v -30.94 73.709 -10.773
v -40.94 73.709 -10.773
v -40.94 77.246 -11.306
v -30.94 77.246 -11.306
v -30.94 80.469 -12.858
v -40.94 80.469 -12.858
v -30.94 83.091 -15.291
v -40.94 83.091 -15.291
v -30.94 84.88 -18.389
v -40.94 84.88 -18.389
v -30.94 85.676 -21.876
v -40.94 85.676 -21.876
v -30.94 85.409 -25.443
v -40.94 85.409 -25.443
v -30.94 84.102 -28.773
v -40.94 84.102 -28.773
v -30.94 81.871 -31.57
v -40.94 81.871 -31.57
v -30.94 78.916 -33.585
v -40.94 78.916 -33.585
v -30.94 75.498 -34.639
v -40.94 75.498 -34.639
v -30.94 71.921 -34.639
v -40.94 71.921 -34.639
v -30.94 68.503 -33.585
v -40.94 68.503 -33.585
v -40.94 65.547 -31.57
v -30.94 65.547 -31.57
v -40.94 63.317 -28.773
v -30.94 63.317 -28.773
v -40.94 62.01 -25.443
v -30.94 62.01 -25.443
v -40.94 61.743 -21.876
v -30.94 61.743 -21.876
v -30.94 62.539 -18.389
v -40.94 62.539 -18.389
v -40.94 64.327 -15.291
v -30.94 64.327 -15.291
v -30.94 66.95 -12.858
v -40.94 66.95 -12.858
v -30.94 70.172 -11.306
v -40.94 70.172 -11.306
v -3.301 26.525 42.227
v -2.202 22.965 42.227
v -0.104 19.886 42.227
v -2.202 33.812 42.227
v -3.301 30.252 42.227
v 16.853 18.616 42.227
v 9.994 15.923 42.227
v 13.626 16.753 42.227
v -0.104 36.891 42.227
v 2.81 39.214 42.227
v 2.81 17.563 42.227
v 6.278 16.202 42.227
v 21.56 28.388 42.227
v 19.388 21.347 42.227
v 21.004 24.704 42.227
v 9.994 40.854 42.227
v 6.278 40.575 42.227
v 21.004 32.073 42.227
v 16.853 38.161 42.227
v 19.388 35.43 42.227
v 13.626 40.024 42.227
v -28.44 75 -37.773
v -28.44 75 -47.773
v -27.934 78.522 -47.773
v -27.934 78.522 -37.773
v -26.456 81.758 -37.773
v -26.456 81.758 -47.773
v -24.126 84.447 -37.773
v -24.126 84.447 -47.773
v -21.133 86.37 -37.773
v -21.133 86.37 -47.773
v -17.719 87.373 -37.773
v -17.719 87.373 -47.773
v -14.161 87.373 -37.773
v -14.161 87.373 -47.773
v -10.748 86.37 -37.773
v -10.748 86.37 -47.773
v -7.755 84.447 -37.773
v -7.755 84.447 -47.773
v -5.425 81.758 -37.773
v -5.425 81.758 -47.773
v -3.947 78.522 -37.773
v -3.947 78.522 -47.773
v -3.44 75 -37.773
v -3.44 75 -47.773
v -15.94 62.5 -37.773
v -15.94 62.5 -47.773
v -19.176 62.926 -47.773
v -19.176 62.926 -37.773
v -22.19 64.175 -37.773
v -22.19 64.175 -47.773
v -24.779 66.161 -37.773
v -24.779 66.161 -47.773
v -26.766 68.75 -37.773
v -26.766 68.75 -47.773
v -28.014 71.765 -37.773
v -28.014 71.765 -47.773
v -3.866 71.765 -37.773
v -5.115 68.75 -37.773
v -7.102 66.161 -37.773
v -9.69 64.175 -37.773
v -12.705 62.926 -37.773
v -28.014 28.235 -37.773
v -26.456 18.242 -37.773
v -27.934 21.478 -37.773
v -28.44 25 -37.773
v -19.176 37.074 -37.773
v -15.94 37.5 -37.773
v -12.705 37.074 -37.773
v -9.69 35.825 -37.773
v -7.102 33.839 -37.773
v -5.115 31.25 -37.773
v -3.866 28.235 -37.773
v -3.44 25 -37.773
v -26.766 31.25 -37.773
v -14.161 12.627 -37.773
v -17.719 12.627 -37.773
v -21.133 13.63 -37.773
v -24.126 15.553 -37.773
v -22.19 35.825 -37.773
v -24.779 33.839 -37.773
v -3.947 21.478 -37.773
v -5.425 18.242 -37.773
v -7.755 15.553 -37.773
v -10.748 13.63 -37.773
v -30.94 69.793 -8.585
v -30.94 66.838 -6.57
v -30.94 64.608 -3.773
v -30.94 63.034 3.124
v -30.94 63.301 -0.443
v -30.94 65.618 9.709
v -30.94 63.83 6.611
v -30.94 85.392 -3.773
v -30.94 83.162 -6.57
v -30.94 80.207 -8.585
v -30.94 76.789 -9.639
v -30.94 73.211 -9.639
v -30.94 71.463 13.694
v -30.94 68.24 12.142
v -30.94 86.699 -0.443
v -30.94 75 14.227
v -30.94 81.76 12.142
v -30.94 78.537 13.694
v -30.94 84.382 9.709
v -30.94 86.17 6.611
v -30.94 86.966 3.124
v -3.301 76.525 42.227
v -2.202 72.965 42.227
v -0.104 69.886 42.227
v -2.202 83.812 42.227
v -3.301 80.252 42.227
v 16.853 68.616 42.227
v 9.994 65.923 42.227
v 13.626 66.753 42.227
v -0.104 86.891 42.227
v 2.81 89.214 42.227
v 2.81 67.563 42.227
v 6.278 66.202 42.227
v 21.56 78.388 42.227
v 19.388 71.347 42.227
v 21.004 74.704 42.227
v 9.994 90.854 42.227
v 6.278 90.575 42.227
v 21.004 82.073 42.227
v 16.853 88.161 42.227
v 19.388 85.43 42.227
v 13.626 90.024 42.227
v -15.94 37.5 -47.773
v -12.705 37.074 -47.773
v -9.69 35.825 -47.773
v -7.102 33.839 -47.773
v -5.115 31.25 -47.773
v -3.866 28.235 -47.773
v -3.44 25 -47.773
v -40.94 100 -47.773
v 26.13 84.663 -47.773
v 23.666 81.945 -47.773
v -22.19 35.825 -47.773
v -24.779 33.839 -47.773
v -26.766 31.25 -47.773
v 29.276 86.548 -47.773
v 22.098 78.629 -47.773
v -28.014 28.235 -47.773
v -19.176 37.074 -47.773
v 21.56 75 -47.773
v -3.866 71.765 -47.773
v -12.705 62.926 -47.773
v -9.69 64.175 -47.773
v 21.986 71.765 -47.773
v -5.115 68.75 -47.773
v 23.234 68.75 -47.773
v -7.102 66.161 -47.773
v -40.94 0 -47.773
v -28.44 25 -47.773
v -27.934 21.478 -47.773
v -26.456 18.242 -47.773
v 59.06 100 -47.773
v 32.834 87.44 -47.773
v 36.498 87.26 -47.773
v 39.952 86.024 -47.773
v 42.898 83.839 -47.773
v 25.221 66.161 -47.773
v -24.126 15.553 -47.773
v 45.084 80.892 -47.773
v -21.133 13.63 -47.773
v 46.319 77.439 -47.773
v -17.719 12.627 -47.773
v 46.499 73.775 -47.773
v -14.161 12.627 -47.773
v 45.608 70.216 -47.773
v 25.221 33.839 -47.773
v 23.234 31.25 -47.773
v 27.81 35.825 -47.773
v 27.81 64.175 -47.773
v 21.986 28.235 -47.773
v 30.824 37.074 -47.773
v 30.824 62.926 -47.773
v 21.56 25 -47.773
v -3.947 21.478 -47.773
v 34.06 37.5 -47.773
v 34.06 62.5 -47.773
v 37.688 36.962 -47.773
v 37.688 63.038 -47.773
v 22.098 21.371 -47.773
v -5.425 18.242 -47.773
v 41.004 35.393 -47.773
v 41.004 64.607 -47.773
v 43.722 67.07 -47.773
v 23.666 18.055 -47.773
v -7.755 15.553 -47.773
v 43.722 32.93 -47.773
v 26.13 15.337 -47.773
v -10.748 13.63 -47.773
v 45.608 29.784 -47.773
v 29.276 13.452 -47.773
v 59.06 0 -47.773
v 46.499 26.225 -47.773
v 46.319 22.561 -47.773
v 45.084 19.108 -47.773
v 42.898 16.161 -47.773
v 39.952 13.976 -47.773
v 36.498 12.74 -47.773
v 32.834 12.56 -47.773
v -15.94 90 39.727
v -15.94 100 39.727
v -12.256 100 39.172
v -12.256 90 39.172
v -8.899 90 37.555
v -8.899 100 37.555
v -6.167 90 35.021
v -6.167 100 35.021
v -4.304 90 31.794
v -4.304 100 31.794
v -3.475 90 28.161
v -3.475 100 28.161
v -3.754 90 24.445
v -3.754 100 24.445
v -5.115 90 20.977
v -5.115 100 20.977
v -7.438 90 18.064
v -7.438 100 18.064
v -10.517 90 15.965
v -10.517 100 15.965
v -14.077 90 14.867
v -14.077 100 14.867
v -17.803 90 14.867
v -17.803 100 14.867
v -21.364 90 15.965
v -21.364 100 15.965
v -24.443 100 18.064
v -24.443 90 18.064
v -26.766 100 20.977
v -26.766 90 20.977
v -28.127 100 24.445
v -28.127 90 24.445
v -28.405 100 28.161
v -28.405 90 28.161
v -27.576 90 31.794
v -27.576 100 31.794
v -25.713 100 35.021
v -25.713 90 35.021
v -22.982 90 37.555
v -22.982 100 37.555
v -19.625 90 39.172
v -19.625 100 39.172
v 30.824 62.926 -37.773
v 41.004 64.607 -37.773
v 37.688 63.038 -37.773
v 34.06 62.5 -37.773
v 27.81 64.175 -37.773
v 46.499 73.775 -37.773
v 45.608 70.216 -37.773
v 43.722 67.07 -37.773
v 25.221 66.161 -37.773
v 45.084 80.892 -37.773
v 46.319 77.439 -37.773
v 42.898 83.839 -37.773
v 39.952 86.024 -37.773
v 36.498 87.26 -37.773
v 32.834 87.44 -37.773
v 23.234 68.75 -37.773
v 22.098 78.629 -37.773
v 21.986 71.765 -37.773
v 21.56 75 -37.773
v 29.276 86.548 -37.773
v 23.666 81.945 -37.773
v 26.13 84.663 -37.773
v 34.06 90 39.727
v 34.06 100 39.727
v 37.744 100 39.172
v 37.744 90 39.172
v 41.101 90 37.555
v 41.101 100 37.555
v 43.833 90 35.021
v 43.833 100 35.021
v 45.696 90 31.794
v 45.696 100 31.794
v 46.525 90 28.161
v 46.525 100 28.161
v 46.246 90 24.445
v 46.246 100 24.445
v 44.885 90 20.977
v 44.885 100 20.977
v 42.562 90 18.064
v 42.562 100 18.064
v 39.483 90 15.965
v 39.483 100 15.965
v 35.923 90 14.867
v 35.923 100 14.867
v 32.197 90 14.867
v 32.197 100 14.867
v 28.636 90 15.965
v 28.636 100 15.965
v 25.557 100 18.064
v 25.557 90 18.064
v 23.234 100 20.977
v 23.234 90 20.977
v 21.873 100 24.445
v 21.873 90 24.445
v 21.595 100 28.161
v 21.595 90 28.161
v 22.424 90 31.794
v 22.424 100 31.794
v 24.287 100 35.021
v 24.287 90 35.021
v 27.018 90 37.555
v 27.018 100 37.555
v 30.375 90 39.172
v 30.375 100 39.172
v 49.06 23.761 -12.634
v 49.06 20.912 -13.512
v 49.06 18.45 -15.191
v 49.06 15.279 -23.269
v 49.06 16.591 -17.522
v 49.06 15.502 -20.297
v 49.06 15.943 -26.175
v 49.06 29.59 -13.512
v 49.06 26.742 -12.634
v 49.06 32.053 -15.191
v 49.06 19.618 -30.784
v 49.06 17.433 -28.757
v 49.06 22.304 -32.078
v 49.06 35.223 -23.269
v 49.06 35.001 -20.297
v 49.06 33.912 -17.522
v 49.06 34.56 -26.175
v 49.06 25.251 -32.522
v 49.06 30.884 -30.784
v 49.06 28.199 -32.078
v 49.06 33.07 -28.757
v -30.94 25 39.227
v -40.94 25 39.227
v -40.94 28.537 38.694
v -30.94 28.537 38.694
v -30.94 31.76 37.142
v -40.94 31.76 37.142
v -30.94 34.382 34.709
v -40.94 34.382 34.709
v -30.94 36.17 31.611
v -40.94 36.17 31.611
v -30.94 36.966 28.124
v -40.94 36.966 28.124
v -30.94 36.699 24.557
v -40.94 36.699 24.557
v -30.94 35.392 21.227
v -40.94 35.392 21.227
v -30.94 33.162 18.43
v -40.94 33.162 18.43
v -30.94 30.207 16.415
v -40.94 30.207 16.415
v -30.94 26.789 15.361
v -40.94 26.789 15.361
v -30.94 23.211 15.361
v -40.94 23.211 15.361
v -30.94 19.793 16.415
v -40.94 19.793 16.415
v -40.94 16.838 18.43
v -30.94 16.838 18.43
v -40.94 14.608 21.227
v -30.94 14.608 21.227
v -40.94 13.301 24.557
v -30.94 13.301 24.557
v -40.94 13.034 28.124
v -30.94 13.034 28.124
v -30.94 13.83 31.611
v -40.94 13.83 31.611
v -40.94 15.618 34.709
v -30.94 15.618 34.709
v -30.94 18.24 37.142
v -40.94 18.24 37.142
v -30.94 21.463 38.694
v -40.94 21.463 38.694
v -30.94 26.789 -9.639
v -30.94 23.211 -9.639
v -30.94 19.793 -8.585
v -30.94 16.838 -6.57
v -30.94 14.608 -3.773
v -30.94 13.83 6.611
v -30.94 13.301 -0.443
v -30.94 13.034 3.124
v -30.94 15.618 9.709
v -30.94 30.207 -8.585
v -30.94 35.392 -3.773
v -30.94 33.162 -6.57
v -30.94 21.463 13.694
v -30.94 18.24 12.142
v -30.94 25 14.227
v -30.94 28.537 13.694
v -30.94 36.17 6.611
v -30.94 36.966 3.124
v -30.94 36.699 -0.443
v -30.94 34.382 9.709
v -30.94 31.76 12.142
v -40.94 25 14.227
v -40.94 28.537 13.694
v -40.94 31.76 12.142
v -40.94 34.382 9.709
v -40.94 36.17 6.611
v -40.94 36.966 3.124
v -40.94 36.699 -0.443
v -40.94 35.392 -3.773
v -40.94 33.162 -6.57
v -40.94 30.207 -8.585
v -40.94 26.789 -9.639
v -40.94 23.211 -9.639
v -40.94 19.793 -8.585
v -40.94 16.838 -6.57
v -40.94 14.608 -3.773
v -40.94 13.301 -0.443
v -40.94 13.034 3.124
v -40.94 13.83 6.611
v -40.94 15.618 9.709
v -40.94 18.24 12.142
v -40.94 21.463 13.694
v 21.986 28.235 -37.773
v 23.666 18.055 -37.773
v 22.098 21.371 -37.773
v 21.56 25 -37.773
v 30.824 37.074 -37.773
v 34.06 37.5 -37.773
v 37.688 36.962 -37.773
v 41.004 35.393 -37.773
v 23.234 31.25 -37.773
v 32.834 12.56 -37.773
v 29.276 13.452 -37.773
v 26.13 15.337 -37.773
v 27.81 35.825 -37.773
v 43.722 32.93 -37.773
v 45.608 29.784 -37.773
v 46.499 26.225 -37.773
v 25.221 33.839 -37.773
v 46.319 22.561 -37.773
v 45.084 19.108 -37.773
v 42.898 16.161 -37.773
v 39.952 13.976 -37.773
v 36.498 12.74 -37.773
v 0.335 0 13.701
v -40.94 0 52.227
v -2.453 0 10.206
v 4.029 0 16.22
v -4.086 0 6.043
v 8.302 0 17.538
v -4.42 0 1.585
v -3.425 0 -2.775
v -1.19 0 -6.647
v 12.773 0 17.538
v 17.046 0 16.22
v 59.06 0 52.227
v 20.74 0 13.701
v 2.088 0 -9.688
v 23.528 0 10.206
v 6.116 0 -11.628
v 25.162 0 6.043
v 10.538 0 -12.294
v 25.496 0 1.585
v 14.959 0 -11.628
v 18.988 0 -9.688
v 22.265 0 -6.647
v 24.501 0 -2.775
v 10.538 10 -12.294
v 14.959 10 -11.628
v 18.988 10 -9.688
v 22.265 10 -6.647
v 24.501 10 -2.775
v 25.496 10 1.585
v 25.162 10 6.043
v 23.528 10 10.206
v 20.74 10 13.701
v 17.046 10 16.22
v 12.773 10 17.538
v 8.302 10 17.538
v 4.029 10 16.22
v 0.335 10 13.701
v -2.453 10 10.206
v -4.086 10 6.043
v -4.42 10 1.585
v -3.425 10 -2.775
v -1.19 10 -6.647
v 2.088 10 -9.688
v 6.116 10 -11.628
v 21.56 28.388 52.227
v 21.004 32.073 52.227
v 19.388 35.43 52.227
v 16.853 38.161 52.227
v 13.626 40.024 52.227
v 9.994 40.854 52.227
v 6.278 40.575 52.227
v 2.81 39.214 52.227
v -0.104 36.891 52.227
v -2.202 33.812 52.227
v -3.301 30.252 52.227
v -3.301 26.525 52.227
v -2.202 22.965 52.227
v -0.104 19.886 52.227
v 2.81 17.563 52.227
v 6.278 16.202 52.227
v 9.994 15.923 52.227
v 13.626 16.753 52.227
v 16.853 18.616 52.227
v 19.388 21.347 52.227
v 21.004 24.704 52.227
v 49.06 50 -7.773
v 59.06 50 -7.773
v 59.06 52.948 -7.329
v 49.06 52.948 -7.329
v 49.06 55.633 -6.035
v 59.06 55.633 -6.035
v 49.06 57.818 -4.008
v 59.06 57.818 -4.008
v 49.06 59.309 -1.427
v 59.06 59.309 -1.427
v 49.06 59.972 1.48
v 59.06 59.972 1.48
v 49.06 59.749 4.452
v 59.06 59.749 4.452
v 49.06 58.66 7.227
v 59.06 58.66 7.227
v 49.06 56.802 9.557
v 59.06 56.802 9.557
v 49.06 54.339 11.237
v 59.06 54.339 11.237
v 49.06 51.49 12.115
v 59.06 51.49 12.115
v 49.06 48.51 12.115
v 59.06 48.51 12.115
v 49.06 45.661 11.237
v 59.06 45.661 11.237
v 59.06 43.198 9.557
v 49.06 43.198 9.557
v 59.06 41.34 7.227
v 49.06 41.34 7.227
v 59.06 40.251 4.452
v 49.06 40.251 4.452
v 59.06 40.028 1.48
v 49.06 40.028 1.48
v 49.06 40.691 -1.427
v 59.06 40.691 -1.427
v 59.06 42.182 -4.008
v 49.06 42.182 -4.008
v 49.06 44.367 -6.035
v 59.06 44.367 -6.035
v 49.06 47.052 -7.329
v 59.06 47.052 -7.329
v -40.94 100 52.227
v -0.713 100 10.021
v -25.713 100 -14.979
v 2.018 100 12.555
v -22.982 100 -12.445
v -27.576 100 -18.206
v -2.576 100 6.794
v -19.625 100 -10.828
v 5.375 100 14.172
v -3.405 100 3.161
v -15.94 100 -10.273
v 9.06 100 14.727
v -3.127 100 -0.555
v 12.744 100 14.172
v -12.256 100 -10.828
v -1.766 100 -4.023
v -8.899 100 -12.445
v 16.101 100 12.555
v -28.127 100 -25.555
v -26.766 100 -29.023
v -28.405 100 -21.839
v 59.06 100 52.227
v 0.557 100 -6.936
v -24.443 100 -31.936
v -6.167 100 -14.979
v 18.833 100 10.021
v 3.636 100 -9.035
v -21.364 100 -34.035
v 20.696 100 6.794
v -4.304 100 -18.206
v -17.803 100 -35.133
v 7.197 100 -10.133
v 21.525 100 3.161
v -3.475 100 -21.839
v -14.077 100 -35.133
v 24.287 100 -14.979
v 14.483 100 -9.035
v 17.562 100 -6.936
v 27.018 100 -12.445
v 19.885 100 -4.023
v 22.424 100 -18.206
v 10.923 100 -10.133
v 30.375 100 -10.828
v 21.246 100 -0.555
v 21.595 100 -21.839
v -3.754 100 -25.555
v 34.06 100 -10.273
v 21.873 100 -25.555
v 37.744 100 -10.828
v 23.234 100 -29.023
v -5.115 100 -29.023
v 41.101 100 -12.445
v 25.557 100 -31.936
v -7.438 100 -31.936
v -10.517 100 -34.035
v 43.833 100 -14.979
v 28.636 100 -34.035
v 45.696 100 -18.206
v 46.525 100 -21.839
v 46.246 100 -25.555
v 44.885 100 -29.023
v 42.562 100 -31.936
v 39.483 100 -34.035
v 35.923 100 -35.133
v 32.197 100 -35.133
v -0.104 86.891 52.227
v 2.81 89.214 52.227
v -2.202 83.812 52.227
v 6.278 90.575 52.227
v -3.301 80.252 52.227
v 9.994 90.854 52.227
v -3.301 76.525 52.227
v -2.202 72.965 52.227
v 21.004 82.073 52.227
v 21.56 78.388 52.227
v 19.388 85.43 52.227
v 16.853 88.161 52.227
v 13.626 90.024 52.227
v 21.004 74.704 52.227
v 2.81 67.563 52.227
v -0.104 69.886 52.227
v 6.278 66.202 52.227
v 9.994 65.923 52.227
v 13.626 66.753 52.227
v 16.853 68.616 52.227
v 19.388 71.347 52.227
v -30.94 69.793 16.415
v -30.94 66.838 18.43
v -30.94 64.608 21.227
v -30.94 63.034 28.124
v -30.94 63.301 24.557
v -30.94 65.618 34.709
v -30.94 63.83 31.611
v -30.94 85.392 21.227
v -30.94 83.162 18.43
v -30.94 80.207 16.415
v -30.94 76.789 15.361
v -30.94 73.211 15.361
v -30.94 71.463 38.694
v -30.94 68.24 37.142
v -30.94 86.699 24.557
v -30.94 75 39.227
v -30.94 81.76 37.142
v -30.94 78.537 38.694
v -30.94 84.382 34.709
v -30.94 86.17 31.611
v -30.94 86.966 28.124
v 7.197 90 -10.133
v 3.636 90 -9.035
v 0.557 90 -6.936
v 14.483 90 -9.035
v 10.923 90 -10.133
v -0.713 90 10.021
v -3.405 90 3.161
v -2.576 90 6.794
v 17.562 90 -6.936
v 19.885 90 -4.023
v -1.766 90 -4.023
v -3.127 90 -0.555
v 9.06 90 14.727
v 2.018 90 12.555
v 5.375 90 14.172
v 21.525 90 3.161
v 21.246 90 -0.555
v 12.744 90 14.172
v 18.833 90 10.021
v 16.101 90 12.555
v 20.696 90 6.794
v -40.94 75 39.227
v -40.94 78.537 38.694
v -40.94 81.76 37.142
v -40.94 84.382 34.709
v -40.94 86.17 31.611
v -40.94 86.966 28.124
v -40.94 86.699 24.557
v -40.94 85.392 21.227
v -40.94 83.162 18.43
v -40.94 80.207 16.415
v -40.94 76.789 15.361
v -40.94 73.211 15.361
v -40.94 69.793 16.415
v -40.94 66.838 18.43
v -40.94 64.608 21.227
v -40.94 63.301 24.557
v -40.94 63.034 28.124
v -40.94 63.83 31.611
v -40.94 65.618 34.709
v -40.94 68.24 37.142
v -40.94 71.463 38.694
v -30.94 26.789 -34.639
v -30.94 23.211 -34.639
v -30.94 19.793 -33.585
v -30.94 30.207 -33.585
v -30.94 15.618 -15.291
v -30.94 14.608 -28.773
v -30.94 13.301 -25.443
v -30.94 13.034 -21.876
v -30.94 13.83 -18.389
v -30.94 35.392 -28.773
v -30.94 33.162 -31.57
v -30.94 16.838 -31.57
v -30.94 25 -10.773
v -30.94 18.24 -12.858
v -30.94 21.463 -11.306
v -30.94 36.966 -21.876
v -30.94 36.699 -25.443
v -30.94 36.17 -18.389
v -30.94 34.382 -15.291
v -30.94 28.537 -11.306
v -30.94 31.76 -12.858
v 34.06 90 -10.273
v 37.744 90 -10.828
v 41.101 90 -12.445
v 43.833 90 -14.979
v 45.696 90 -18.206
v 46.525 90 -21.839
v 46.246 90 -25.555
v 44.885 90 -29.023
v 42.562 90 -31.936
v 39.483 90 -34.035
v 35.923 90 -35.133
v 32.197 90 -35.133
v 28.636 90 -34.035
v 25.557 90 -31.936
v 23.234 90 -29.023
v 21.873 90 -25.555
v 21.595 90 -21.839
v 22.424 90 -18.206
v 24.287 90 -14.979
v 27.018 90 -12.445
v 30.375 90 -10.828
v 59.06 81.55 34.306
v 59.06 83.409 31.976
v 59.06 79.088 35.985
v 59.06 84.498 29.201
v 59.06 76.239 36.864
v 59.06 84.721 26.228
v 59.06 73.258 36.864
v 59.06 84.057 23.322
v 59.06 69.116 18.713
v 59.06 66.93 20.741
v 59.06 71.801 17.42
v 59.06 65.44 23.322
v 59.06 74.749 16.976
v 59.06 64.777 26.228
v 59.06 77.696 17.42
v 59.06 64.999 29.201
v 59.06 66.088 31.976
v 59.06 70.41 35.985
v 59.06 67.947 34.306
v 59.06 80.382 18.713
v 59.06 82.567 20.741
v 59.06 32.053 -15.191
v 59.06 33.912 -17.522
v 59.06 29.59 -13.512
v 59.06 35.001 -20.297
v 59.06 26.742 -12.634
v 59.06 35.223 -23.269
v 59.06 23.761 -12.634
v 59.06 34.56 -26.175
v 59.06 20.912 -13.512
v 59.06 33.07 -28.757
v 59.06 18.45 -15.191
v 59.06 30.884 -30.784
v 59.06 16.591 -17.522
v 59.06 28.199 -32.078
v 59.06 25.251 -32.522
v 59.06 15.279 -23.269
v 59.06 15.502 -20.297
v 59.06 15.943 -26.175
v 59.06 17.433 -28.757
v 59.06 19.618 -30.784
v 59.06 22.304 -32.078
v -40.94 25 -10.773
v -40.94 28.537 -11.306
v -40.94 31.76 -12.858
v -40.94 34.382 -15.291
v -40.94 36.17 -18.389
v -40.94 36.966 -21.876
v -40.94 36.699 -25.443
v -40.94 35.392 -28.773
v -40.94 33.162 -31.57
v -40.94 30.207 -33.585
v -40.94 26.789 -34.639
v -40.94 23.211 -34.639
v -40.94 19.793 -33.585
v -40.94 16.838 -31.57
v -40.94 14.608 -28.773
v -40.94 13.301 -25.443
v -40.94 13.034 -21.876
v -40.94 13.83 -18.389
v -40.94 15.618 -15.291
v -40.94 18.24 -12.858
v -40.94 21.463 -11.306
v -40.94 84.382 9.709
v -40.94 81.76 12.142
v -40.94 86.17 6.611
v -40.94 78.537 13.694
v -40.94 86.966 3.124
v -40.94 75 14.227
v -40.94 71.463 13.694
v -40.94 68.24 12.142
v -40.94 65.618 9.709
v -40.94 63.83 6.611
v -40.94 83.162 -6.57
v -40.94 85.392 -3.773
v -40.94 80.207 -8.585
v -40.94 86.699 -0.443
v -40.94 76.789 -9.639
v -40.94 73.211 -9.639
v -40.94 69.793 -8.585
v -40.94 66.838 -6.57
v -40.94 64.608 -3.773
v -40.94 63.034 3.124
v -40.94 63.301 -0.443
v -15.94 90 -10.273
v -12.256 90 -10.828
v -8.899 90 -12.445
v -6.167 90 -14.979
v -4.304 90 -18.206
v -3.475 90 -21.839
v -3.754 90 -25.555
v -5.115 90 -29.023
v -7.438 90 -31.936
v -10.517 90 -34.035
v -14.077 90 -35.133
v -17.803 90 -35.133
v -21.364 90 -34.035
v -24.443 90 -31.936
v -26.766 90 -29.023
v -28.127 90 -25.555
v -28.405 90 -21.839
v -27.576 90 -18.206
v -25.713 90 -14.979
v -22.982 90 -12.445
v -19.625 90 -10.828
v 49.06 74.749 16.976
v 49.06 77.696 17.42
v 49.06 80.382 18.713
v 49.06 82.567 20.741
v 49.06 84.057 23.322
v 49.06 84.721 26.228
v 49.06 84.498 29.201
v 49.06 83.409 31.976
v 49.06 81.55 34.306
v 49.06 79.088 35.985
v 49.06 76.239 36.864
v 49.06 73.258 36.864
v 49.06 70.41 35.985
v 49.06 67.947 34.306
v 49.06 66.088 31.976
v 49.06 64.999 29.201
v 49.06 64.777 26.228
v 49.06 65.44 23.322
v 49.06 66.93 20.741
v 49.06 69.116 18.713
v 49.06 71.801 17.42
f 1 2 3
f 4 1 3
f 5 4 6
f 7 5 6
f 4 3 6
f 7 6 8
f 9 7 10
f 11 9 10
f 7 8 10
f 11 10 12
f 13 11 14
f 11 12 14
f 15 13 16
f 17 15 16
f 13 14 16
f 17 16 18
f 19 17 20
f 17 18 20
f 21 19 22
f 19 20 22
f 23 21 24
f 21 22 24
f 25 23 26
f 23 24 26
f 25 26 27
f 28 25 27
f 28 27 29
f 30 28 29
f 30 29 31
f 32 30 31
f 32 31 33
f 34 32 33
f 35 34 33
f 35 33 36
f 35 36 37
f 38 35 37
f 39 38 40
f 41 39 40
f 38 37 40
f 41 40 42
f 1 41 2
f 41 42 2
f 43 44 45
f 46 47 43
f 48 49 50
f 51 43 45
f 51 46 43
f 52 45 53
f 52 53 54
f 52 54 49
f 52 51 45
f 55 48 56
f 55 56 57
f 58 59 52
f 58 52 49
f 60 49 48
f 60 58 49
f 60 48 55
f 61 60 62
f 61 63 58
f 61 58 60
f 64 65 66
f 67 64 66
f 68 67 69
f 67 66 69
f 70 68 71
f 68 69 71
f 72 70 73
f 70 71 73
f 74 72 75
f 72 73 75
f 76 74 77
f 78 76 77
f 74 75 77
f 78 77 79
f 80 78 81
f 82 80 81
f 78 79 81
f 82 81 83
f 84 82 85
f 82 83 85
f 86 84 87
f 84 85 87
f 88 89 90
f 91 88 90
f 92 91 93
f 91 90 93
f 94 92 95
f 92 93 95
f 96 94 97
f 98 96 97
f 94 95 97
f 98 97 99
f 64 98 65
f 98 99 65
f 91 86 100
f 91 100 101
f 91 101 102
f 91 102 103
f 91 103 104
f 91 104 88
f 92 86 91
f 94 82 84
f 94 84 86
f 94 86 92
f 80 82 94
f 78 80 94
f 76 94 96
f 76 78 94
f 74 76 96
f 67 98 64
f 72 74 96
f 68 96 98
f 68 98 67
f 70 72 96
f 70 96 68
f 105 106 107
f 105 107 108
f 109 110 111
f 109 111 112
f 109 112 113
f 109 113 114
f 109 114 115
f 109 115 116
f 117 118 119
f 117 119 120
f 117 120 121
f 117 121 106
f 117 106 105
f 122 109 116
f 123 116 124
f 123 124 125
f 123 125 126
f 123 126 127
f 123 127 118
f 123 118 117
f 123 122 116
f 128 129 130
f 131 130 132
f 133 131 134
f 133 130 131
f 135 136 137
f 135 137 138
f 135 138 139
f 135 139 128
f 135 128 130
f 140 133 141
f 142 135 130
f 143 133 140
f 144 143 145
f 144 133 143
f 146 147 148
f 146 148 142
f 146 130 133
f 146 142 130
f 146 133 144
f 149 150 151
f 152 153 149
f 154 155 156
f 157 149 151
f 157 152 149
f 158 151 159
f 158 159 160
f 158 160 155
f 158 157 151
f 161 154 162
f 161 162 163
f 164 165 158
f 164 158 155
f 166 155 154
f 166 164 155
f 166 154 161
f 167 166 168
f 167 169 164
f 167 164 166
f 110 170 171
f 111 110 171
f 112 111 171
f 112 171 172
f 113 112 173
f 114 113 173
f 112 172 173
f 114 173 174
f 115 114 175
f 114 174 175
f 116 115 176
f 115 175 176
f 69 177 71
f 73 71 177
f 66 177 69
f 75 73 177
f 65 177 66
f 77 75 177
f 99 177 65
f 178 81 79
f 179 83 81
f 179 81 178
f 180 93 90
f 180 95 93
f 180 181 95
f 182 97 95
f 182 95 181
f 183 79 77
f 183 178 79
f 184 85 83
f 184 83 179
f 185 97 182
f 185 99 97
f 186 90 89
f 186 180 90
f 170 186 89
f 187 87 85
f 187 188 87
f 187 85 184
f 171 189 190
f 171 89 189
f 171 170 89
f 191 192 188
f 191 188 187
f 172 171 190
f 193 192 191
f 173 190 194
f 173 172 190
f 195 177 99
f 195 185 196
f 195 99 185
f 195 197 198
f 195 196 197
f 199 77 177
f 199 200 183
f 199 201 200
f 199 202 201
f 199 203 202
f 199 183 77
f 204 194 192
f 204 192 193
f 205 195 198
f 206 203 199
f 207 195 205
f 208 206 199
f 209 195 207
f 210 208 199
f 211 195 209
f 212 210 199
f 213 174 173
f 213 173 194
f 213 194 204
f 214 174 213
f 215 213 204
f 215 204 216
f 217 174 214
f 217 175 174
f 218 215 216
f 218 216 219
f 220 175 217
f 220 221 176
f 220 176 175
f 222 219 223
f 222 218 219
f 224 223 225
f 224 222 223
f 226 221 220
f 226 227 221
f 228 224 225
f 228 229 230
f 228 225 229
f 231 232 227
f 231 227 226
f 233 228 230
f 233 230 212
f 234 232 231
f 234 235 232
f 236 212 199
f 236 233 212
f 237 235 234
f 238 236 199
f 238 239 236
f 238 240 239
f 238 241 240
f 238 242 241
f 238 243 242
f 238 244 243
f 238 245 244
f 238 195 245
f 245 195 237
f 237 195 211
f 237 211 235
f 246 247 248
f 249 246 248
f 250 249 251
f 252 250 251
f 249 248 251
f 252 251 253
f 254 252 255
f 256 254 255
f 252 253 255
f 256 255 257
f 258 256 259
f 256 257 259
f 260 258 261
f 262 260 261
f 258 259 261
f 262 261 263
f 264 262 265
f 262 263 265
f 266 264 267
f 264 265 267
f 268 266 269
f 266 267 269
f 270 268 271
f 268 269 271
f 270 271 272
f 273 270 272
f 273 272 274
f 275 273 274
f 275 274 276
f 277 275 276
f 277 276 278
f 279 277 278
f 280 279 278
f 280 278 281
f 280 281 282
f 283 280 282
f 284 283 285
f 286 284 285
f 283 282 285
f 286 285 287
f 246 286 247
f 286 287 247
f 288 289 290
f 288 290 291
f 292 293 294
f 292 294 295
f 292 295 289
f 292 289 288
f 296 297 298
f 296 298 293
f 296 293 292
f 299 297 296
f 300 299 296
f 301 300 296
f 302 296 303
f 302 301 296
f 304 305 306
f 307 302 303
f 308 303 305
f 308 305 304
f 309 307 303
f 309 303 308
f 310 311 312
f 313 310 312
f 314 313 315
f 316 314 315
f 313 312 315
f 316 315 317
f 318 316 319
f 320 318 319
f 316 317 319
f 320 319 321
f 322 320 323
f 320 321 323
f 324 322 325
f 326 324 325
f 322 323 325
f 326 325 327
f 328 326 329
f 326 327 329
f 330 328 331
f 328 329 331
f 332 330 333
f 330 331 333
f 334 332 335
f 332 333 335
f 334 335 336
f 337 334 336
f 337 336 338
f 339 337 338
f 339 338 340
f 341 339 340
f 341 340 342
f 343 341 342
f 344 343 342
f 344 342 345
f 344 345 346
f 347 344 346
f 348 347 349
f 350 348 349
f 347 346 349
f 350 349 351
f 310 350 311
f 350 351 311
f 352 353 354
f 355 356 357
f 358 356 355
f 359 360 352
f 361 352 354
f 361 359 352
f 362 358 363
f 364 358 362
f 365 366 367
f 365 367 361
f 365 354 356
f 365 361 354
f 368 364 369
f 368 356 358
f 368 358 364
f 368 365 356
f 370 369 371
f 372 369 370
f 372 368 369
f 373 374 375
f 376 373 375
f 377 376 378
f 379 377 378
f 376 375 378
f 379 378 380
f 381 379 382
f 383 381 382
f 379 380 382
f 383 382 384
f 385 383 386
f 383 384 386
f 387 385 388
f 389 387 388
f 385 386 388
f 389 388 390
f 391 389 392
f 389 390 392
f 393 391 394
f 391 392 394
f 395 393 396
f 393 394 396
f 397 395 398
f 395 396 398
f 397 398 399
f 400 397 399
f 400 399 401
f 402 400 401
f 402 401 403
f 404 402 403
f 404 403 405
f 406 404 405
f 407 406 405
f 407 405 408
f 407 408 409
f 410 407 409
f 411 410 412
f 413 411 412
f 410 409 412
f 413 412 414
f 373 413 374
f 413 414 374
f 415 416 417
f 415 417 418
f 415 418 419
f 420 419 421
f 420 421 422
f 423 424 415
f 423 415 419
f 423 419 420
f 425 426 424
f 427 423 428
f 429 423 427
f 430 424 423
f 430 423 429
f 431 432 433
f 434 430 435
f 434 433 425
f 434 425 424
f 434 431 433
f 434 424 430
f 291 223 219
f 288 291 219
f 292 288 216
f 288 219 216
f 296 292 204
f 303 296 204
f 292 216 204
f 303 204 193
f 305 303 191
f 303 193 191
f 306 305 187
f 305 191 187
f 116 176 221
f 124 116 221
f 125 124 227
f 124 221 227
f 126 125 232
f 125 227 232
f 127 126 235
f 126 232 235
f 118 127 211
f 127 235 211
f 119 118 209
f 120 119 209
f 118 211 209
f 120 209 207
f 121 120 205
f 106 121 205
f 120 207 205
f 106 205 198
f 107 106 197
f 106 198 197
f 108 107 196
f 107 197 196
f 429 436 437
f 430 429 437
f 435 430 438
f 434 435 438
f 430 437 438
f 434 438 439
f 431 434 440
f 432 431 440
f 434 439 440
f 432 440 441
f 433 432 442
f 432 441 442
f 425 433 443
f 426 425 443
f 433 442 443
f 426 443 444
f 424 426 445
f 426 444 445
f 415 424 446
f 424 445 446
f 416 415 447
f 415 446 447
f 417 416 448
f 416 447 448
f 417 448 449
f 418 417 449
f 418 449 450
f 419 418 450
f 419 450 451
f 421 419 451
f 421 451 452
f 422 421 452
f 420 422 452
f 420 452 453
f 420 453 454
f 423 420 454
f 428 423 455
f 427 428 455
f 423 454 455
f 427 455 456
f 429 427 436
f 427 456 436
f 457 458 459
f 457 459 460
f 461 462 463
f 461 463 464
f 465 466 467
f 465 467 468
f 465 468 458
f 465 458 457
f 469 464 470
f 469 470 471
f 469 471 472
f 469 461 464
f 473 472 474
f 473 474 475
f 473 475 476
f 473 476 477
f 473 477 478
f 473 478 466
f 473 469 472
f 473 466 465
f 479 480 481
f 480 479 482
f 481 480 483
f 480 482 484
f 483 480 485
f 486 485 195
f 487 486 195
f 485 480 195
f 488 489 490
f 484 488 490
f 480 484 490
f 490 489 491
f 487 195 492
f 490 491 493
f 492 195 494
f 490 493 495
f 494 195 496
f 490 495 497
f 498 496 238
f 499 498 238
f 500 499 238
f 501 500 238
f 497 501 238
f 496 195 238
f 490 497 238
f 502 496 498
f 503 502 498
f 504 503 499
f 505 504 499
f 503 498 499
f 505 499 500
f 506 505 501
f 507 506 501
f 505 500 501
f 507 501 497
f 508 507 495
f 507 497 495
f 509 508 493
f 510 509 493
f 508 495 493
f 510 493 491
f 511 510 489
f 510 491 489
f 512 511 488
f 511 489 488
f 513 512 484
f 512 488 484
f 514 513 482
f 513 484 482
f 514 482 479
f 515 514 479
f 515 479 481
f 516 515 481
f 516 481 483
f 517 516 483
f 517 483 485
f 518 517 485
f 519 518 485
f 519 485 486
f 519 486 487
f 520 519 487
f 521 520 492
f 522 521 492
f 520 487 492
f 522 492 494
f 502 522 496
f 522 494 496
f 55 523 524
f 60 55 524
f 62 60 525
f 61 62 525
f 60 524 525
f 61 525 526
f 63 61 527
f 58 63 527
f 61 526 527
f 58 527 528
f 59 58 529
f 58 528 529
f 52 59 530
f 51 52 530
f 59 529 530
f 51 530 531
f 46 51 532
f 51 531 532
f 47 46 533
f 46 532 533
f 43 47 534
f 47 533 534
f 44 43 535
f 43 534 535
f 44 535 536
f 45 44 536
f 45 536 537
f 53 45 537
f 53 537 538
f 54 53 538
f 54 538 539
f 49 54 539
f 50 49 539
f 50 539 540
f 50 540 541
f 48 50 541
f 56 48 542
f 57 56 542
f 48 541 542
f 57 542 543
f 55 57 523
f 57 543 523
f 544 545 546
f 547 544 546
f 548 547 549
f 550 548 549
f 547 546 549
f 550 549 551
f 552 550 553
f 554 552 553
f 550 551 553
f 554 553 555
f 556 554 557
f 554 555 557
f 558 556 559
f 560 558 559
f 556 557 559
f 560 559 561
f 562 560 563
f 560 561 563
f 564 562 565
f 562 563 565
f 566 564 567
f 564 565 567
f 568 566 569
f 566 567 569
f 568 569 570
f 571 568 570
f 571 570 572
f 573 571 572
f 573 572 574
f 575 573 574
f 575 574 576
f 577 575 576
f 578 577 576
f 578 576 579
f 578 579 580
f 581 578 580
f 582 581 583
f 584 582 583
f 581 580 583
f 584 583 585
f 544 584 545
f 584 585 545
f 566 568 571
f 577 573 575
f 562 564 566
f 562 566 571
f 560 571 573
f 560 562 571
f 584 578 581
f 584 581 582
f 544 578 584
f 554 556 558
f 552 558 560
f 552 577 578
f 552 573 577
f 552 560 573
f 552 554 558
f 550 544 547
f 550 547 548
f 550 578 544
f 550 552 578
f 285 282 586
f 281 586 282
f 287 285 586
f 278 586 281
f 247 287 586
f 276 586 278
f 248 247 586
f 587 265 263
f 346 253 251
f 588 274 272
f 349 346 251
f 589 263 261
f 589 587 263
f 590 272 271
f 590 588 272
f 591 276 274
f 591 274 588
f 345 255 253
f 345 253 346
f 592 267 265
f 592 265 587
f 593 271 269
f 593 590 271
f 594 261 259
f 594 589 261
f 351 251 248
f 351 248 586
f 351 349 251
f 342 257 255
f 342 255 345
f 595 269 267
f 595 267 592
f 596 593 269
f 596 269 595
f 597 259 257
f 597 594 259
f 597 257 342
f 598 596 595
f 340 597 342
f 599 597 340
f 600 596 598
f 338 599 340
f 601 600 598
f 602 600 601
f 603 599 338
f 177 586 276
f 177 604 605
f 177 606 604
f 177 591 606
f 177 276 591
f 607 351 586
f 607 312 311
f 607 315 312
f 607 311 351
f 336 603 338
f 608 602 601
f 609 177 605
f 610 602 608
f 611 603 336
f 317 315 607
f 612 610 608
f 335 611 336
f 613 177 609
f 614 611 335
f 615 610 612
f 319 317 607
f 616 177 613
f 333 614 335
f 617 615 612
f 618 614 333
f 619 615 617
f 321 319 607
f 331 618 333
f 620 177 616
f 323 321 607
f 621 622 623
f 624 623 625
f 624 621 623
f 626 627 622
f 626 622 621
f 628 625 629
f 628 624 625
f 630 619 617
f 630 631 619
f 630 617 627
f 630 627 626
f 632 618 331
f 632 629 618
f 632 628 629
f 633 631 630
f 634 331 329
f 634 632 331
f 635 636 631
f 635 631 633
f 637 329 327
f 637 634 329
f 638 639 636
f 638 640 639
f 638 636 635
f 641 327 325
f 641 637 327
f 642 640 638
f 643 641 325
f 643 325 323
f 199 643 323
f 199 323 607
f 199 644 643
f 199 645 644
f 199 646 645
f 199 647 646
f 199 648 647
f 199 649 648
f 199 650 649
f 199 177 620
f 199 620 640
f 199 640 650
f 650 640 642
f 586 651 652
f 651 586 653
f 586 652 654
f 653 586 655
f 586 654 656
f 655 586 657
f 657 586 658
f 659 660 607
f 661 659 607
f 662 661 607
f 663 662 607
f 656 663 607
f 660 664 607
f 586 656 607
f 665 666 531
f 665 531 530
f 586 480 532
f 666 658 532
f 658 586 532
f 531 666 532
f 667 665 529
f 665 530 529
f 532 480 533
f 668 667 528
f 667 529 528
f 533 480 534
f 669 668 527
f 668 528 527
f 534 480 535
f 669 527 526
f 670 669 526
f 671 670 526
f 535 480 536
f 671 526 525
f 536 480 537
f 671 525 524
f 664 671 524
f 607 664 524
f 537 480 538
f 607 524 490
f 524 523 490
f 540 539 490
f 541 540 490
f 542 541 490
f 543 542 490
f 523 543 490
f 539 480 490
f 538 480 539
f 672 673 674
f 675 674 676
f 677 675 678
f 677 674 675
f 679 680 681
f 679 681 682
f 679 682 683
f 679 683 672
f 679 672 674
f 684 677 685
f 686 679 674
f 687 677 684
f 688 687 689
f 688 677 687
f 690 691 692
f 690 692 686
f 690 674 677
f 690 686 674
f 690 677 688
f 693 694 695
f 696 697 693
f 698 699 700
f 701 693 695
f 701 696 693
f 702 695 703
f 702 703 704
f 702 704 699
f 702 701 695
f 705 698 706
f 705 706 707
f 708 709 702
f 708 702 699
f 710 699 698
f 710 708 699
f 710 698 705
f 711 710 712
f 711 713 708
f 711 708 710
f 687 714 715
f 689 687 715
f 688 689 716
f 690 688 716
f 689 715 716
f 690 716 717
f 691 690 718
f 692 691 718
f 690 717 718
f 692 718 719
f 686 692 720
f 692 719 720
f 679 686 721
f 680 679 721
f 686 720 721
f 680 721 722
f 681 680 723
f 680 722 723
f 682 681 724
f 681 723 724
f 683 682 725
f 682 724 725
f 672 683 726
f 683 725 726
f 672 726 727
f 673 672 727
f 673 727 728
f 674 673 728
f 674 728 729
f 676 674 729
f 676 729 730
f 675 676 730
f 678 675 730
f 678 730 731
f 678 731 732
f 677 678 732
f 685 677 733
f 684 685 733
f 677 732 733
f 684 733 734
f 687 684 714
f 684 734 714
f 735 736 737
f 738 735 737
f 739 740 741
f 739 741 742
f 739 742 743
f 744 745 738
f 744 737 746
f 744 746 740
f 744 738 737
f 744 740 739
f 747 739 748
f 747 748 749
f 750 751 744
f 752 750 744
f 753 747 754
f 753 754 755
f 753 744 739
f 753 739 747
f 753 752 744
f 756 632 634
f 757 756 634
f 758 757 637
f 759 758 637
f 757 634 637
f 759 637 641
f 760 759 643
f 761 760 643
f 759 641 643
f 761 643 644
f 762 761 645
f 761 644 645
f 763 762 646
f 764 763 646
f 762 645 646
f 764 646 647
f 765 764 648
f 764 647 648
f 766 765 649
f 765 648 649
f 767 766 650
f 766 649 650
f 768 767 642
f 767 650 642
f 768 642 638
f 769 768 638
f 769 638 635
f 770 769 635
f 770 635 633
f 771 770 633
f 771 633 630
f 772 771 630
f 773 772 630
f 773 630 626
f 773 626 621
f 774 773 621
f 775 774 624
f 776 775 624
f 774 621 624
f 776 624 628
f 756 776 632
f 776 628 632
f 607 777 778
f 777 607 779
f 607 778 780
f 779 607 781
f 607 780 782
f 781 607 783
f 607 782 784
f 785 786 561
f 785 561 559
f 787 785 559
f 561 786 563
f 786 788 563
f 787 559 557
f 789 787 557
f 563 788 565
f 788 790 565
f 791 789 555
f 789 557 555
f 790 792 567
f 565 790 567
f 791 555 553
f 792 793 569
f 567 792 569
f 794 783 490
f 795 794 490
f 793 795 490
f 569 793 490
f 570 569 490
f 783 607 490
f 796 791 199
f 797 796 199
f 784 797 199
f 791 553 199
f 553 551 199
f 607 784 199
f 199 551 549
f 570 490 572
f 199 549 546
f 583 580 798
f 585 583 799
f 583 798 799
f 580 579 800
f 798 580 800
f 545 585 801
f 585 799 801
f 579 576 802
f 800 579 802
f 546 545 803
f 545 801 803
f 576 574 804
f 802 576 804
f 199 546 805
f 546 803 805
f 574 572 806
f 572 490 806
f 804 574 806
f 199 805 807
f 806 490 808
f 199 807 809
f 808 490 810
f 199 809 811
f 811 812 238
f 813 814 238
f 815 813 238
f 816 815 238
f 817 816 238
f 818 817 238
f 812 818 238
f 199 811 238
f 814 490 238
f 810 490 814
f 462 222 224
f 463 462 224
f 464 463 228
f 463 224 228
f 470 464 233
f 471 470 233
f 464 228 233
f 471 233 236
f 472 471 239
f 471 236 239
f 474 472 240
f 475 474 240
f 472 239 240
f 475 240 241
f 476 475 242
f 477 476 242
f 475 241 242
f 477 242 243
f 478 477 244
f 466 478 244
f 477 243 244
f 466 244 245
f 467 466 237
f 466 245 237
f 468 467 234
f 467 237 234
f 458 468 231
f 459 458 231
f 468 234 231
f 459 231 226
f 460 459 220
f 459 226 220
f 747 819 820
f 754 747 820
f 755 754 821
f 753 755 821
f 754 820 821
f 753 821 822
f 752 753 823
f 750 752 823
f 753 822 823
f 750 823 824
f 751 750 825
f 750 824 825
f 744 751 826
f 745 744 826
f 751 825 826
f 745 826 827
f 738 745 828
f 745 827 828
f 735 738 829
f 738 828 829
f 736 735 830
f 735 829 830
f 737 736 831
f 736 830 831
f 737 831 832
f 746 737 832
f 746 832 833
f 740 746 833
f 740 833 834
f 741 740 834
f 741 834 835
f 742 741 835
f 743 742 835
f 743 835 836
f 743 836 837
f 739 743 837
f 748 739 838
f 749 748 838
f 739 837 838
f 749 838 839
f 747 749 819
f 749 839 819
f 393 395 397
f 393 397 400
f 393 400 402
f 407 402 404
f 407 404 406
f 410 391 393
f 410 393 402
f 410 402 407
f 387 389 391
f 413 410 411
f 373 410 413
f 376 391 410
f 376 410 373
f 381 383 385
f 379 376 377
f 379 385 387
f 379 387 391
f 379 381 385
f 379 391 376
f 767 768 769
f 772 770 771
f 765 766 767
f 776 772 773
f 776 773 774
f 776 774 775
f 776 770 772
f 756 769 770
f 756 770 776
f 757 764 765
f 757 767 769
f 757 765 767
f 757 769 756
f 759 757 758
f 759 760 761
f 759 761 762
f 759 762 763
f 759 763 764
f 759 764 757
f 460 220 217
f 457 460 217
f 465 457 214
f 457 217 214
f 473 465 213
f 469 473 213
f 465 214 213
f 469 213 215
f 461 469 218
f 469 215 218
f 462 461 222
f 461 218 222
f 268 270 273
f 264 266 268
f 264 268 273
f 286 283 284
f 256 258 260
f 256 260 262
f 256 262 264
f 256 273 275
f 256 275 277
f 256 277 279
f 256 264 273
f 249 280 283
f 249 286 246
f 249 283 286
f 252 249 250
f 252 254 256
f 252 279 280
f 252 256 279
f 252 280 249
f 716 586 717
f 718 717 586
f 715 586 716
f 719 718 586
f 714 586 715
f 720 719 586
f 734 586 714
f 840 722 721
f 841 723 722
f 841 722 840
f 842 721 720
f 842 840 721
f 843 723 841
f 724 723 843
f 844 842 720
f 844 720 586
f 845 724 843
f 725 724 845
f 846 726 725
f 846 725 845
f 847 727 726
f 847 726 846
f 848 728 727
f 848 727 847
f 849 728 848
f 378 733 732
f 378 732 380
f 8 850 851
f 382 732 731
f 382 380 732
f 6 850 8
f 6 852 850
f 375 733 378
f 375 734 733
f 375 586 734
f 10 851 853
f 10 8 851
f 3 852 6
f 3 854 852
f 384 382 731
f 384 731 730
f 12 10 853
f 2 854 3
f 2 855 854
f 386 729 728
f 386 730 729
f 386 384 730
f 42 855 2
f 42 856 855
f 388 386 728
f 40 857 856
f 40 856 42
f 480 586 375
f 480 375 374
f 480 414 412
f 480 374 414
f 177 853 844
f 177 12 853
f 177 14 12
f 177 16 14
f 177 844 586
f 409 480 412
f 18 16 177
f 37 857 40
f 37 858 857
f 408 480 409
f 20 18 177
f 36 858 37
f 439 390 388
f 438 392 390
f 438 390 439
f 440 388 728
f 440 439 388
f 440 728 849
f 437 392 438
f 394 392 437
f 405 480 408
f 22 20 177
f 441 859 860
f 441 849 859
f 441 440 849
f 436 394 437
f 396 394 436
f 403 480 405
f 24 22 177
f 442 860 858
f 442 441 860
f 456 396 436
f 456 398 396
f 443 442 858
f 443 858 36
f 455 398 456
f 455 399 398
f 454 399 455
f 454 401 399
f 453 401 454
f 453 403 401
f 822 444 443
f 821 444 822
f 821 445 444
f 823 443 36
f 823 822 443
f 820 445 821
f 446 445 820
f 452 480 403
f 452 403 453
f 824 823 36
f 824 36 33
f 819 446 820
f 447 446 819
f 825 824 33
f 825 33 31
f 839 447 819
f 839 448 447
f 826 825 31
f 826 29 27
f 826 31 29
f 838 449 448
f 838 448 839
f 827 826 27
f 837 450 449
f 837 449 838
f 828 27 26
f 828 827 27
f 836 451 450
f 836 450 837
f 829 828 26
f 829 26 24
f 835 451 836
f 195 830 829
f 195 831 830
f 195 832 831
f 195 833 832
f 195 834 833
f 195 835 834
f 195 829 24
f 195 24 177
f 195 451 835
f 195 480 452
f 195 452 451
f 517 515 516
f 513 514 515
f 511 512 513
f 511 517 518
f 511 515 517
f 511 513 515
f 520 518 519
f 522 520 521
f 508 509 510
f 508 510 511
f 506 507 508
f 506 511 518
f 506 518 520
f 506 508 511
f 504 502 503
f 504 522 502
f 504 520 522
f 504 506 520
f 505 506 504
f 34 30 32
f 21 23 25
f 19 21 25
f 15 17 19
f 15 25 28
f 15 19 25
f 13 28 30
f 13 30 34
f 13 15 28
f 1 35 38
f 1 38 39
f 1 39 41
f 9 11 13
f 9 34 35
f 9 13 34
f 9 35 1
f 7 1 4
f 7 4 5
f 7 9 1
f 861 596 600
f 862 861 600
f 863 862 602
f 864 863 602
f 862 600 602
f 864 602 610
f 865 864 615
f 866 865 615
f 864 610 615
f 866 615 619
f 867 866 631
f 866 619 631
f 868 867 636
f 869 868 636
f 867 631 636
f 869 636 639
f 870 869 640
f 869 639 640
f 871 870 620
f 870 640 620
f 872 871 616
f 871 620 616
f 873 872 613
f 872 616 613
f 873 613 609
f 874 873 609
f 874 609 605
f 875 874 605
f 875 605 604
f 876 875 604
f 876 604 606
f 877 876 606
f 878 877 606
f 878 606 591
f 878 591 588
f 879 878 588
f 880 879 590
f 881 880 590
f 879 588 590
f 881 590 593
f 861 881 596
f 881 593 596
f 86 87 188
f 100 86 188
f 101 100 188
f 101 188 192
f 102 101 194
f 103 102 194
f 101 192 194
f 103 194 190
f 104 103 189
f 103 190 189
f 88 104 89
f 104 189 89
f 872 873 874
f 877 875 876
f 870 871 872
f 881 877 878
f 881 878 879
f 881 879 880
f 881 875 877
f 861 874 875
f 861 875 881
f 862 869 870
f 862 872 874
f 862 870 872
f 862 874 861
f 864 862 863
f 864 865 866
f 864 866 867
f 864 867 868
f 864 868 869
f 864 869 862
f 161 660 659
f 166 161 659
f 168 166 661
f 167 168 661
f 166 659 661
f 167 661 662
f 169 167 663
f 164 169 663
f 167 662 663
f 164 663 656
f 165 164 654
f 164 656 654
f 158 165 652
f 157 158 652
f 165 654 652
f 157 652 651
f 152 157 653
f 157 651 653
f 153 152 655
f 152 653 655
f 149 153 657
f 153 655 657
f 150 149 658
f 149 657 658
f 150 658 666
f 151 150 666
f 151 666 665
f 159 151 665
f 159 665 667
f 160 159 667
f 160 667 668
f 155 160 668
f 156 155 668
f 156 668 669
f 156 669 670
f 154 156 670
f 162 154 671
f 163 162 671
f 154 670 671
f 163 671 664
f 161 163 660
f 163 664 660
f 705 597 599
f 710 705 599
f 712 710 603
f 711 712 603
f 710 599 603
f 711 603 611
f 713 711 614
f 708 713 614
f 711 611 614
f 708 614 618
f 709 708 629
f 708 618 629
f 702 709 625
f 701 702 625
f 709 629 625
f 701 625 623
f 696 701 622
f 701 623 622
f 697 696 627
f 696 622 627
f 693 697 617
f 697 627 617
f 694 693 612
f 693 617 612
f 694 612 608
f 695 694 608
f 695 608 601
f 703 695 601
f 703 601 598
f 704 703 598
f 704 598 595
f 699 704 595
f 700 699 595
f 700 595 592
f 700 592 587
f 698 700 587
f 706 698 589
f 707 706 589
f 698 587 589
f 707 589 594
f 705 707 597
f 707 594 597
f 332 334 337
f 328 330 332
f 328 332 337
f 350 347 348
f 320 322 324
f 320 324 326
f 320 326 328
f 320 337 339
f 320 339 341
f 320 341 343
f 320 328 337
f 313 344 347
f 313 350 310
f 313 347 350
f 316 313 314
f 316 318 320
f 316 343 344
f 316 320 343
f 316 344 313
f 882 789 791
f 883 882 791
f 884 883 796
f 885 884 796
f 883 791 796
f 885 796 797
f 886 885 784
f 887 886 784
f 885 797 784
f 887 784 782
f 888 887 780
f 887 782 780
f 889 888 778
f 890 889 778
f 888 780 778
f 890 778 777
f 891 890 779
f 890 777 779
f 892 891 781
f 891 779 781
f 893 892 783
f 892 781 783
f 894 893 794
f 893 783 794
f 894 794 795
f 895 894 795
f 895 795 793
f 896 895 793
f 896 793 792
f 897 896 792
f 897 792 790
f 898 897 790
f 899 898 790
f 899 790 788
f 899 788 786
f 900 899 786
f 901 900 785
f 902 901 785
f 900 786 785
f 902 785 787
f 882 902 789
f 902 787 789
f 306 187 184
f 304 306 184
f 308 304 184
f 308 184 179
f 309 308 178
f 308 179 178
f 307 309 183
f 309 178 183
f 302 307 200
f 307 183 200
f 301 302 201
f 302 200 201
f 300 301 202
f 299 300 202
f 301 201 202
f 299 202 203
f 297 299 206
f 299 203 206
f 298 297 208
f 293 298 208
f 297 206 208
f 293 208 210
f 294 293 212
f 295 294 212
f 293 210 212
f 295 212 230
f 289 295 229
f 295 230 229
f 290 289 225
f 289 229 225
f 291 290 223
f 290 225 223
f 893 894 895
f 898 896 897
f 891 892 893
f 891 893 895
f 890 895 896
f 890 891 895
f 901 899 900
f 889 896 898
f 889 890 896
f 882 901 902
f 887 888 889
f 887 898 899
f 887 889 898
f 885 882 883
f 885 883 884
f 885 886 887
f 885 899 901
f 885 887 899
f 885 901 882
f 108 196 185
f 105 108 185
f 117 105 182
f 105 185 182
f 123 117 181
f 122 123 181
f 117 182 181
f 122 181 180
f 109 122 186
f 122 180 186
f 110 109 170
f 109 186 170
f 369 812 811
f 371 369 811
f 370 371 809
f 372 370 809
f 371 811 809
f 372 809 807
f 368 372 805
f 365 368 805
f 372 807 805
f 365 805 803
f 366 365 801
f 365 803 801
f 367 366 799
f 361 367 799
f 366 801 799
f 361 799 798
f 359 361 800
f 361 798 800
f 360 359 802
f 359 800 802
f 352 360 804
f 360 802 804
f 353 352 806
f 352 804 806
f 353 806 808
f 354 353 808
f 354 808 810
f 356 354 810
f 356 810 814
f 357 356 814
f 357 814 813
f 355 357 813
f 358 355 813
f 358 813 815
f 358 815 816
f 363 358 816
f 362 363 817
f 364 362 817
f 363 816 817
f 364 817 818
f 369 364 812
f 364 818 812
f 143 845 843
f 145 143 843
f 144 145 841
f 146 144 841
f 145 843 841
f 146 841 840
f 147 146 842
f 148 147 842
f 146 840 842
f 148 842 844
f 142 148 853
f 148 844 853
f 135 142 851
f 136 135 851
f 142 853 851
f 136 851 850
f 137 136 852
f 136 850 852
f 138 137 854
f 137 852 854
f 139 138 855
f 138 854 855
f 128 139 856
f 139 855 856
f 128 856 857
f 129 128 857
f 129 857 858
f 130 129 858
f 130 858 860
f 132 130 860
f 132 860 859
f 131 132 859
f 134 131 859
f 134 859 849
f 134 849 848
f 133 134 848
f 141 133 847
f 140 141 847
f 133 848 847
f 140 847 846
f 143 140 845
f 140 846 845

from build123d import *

# Parameters (mm, degrees)
SKETCH1_W           = 100
SKETCH1_H           = 100
BOSS_EXTRUDE1_DEPTH = 100
SKETCH2_R           = 15
CUT_EXTRUDE2_DEPTH  = 10
SKETCH3_R           = 10
CUT_EXTRUDE3_DEPTH  = 10
CUT_EXTRUDE5_DEPTH  = 10
SKETCH11_R          = 12.5
CUT_EXTRUDE6_DEPTH  = 10
SKETCH12_R          = 12.5
CUT_EXTRUDE7_DEPTH  = 10
SKETCH13_R          = 12
CUT_EXTRUDE12_DEPTH = 10


with BuildPart() as part:
    # Sketch1 → Boss-Extrude1 (new body)
    with BuildSketch(Plane(origin=(0, 0, 0), x_dir=(1, 0, 0), z_dir=(0, 1, 0))):
        with Locations((9.059630809, -2.226900841)):
            Rectangle(SKETCH1_W, SKETCH1_H)
    extrude(amount=BOSS_EXTRUDE1_DEPTH)

    # Sketch2 → Cut-Extrude2 (cut)
    with BuildSketch(Plane.XZ):
        with Locations(Location((10.537704993, 2.705564775, 0), (0, 0, 270))):
            Circle(SKETCH2_R)
    extrude(amount=-CUT_EXTRUDE2_DEPTH, mode=Mode.SUBTRACT)

    # Sketch3 → Cut-Extrude3 (cut)
    with BuildSketch(Plane(origin=(59.059630809, 0, 0), x_dir=(0, 0, -1), z_dir=(1, 0, 0))):
        with Locations((-2.226900841, 50)):
            Circle(SKETCH3_R)
        with Locations((22.5218365, 25.251262658)):
            Circle(SKETCH3_R)
        with Locations((-26.975638183, 74.748737342)):
            Circle(SKETCH3_R)
    extrude(amount=-CUT_EXTRUDE3_DEPTH, mode=Mode.SUBTRACT)

    # Sketch5 → Cut-Extrude5 (cut)
    with BuildSketch(Plane(origin=(0, 0, -47.773099159), x_dir=(-1, 0, 0), z_dir=(0, 0, -1))):
        with BuildLine():
            ThreePointArc((-34.059630809, 62.5), (-25.220796045, 66.161165235), (-21.559630809, 75))
            Line((-21.559630809, 75), (-34.059630809, 75))
            Line((-34.059630809, 75), (-34.059630809, 62.5))
        make_face()
        with BuildLine():
            Line((-34.059630809, 75), (-21.559630809, 75))
            ThreePointArc((-21.559630809, 75), (-42.898465574, 83.838834765), (-34.059630809, 62.5))
            Line((-34.059630809, 62.5), (-34.059630809, 75))
        make_face()
        with BuildLine():
            ThreePointArc((28.440369191, 75), (15.940369191, 87.5), (3.440369191, 75))
            Line((3.440369191, 75), (15.940369191, 75))
            Line((15.940369191, 75), (15.940369191, 62.5))
            ThreePointArc((15.940369191, 62.5), (24.779203955, 66.161165235), (28.440369191, 75))
        make_face()
        with BuildLine():
            Line((15.940369191, 75), (3.440369191, 75))
            ThreePointArc((3.440369191, 75), (7.101534426, 66.161165235), (15.940369191, 62.5))
            Line((15.940369191, 62.5), (15.940369191, 75))
        make_face()
        with BuildLine():
            ThreePointArc((-21.559630809, 25), (-25.220796045, 33.838834765), (-34.059630809, 37.5))
            Line((-34.059630809, 37.5), (-34.059630809, 25))
            Line((-34.059630809, 25), (-21.559630809, 25))
        make_face()
        with BuildLine():
            Line((-34.059630809, 25), (-34.059630809, 37.5))
            ThreePointArc((-34.059630809, 37.5), (-42.898465574, 16.161165235), (-21.559630809, 25))
            Line((-21.559630809, 25), (-34.059630809, 25))
        make_face()
        with BuildLine():
            ThreePointArc((28.440369191, 25), (24.779203955, 33.838834765), (15.940369191, 37.5))
            Line((15.940369191, 37.5), (15.940369191, 25))
            Line((15.940369191, 25), (3.440369191, 25))
            ThreePointArc((3.440369191, 25), (15.940369191, 12.5), (28.440369191, 25))
        make_face()
        with BuildLine():
            Line((15.940369191, 25), (15.940369191, 37.5))
            ThreePointArc((15.940369191, 37.5), (7.101534426, 33.838834765), (3.440369191, 25))
            Line((3.440369191, 25), (15.940369191, 25))
        make_face()
    extrude(amount=-CUT_EXTRUDE5_DEPTH, mode=Mode.SUBTRACT)

    # Sketch11 → Cut-Extrude6 (cut)
    with BuildSketch(Plane(origin=(0, 100, 0), x_dir=(1, 0, 0), z_dir=(0, 1, 0))):
        with Locations(Location((34.059630809, -27.226900841, 0), (0, 0, 270))):
            Circle(SKETCH11_R)
        with Locations(Location((34.059630809, 22.773099159, 0), (0, 0, 270))):
            Circle(SKETCH11_R)
        with Locations(Location((9.059630809, -2.226900841, 0), (0, 0, 270))):
            Circle(SKETCH11_R)
        with Locations(Location((-15.940369191, 22.773099159, 0), (0, 0, 270))):
            Circle(SKETCH11_R)
        with Locations(Location((-15.940369191, -27.226900841, 0), (0, 0, 270))):
            Circle(SKETCH11_R)
    extrude(amount=-CUT_EXTRUDE6_DEPTH, mode=Mode.SUBTRACT)

    # Sketch12 → Cut-Extrude7 (cut)
    with BuildSketch(Plane.XY.offset(52.226900841)):
        with Locations((9.059630809, 78.388490916)):
            Circle(SKETCH12_R)
        with Locations((9.059630809, 28.388490916)):
            Circle(SKETCH12_R)
    extrude(amount=-CUT_EXTRUDE7_DEPTH, mode=Mode.SUBTRACT)

    # Sketch13 → Cut-Extrude12 (cut)
    with BuildSketch(Plane.ZY.offset(40.940369191)):
        with Locations((-22.773099159, 25)):
            Circle(SKETCH13_R)
        with Locations((-22.773099159, 73.709409376)):
            Circle(SKETCH13_R)
        with Locations((2.226900841, 75)):
            Circle(SKETCH13_R)
        with Locations((2.226900841, 25)):
            Circle(SKETCH13_R)
        with Locations((27.226900841, 25)):
            Circle(SKETCH13_R)
        with Locations((27.226900841, 75)):
            Circle(SKETCH13_R)
    extrude(amount=-CUT_EXTRUDE12_DEPTH, mode=Mode.SUBTRACT)


solid = part.part
